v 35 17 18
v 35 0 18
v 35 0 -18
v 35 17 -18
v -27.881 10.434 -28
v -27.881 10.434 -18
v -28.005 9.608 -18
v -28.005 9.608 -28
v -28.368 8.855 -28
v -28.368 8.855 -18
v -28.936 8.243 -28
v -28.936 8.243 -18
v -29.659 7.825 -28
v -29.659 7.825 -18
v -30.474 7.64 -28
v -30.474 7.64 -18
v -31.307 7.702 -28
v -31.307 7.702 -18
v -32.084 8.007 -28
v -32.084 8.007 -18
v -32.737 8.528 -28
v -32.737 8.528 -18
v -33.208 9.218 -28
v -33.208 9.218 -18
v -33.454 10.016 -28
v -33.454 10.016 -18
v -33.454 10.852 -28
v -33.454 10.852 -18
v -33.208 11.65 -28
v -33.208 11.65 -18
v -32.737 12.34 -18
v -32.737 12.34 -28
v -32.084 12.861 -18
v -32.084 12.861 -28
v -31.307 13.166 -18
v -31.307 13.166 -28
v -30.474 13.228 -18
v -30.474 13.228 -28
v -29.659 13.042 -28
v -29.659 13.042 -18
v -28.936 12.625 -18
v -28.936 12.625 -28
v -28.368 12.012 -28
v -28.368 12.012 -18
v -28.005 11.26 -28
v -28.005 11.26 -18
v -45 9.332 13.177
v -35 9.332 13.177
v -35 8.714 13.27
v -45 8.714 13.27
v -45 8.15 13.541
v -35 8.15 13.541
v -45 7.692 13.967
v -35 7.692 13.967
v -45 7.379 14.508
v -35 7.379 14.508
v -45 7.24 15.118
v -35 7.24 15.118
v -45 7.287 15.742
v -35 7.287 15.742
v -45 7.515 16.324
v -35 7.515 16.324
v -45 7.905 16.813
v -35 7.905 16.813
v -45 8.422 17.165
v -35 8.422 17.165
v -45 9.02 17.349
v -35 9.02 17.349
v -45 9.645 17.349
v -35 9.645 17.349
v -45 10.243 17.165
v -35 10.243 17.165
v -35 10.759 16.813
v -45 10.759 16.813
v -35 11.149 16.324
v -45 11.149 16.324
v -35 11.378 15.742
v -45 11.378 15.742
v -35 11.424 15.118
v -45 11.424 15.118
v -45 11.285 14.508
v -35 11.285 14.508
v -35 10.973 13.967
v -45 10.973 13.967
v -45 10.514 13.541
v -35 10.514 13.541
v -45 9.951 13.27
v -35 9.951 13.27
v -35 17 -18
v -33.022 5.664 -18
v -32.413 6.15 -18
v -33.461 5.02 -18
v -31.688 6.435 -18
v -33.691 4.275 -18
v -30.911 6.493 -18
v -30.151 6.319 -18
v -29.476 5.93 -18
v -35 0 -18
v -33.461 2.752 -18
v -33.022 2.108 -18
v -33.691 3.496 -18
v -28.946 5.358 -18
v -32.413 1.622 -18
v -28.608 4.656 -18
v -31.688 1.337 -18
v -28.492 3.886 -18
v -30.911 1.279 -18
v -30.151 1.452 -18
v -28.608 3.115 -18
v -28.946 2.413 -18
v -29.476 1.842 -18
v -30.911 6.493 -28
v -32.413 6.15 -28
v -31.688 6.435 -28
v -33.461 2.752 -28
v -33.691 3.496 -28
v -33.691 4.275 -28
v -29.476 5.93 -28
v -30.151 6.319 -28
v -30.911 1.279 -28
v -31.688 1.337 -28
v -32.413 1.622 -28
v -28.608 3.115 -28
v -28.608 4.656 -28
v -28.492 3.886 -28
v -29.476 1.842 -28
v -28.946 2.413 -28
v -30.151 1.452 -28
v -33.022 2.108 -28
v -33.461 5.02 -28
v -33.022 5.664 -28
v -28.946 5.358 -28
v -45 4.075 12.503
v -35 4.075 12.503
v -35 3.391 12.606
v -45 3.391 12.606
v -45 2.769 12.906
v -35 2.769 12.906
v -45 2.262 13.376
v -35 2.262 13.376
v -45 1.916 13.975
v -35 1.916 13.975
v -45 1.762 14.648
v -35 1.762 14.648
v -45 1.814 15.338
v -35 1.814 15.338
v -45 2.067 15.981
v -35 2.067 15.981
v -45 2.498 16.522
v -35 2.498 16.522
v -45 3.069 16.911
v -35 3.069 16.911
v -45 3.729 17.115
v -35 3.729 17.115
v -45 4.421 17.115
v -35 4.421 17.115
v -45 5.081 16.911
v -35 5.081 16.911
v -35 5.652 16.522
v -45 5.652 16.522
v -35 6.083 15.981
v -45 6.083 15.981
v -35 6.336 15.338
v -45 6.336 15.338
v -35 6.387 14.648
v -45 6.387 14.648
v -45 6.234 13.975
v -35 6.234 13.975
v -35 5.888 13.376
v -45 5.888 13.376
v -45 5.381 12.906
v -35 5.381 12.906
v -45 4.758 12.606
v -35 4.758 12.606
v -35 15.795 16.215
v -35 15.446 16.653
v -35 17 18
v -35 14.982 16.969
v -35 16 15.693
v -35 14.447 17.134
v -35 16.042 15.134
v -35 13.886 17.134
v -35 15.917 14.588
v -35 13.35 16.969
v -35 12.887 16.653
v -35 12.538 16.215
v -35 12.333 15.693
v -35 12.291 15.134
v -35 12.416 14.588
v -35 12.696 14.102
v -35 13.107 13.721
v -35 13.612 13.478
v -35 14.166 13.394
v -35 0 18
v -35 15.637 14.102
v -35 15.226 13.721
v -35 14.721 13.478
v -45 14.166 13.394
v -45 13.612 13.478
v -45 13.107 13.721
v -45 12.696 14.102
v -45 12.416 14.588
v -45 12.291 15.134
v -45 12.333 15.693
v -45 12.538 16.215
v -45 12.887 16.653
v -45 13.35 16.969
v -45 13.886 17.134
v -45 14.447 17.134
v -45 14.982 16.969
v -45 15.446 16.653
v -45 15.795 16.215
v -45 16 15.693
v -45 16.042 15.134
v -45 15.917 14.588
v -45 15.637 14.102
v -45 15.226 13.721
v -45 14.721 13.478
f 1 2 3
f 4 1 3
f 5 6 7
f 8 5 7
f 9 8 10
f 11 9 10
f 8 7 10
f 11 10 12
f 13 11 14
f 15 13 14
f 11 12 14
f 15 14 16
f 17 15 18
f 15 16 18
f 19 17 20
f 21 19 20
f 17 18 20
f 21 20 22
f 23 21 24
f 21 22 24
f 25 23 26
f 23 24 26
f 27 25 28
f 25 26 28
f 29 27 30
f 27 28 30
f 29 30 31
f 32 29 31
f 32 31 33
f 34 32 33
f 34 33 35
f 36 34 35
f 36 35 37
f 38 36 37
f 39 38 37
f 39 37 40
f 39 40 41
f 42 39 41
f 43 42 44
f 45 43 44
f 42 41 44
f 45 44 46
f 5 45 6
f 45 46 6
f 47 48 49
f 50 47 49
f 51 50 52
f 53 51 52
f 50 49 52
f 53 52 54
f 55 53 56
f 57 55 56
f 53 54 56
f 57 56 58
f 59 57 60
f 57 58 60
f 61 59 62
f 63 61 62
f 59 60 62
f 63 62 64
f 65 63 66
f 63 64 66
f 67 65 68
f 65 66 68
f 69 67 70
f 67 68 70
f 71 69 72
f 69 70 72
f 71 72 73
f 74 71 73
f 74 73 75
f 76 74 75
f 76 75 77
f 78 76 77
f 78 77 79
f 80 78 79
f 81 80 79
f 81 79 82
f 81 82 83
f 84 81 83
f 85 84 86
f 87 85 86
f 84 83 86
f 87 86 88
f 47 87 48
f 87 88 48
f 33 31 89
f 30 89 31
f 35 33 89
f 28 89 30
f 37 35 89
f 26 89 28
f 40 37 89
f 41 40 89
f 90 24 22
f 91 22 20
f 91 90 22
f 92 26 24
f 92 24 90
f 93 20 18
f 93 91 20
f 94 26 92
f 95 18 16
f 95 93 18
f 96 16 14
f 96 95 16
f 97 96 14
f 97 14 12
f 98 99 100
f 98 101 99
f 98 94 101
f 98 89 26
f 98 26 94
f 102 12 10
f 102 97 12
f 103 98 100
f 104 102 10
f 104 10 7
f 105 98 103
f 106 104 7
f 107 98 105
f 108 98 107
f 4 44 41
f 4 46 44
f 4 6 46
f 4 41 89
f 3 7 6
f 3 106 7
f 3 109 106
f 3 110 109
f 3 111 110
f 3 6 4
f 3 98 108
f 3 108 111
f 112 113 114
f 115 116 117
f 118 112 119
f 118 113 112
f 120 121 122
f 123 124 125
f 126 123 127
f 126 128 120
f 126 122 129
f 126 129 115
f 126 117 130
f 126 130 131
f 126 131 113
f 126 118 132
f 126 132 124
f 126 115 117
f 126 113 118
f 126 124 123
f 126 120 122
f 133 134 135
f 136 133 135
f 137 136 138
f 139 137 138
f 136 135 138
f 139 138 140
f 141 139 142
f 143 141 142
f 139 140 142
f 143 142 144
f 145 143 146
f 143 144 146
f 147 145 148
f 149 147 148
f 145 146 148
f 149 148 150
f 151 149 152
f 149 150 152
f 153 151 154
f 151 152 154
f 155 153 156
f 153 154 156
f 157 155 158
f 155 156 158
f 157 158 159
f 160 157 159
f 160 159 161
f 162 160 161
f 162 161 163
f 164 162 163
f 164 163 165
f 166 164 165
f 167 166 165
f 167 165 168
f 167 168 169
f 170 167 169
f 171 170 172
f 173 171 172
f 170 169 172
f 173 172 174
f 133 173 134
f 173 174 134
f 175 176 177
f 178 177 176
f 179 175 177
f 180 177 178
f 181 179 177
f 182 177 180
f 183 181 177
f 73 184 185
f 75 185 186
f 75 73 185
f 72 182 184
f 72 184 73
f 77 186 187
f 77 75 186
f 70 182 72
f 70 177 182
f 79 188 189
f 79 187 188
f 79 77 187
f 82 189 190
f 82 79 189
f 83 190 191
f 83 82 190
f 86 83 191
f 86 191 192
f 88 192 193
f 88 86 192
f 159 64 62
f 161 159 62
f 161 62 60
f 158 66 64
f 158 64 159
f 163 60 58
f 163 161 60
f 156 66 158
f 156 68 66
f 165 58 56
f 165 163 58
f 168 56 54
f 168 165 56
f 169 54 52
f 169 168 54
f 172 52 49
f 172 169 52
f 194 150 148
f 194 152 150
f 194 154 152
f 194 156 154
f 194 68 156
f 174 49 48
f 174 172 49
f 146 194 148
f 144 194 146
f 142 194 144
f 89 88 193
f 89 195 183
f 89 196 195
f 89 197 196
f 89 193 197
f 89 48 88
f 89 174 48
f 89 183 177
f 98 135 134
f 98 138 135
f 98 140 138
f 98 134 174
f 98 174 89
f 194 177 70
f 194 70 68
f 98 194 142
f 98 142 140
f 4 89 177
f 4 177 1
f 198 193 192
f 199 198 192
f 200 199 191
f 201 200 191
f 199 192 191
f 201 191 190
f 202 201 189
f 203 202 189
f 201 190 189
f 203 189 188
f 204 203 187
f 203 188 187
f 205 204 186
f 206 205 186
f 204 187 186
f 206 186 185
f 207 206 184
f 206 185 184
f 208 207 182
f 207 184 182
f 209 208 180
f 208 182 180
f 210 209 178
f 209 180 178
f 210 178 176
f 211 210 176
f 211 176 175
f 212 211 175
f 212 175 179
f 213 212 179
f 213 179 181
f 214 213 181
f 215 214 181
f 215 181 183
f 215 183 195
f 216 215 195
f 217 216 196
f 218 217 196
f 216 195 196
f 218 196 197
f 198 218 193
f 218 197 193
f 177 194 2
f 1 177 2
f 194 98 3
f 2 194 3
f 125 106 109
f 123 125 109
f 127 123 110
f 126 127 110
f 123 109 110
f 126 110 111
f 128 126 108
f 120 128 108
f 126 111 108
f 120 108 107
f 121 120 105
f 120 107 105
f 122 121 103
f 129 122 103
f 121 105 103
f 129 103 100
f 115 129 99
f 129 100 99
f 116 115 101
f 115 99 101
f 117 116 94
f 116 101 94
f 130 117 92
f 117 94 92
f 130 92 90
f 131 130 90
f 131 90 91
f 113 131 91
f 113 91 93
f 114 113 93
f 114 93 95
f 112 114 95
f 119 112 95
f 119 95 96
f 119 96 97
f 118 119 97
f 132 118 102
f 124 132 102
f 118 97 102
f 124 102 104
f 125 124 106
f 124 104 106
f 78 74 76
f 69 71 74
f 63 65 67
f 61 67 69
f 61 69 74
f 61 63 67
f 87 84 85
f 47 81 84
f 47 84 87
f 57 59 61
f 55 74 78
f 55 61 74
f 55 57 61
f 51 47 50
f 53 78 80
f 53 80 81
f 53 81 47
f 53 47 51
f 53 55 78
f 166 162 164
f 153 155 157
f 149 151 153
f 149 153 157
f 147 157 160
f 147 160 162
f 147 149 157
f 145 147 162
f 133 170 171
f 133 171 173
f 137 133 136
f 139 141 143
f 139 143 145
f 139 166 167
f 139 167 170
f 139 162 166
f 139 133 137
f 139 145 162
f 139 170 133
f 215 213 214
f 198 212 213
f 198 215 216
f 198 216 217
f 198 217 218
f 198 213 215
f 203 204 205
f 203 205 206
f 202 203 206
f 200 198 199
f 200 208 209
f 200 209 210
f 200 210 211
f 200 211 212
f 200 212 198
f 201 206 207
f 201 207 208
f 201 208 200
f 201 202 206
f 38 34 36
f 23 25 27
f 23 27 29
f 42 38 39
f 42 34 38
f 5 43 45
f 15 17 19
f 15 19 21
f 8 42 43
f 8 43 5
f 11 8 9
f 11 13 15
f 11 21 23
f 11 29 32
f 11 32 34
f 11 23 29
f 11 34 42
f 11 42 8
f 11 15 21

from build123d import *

# Parameters (mm, degrees)
SKETCH3_W           = 70
SKETCH3_H           = 36
BOSS_EXTRUDE2_DEPTH = 17
SKETCH4_R           = 1.880557467
SKETCH4_R_2         = 2.098035393
SKETCH4_R_3         = 2.319039591
BOSS_EXTRUDE3_DEPTH = 10
SKETCH5_R           = 2.614216035
SKETCH5_R_2         = 2.802234852
BOSS_EXTRUDE4_DEPTH = 10


with BuildPart() as part:
    # Sketch3 → Boss-Extrude2 (new body)
    with BuildSketch(Plane(origin=(0, 0, 0), x_dir=(1, 0, 0), z_dir=(0, 1, 0))):
        Rectangle(SKETCH3_W, SKETCH3_H)
    extrude(amount=BOSS_EXTRUDE2_DEPTH)

    # Sketch4 → Boss-Extrude3 (add)
    with BuildSketch(Plane.ZY.offset(35)):
        with Locations(Location((15.274859304, 14.166430081, 0), (0, 0, 180))):
            Circle(SKETCH4_R)
        with Locations(Location((15.274859304, 9.332242636, 0), (0, 0, 180))):
            Circle(SKETCH4_R_2)
        with Locations(Location((14.82177003, 4.074871994, 0), (0, 0, 180))):
            Circle(SKETCH4_R_3)
    extrude(amount=BOSS_EXTRUDE3_DEPTH)

    # Sketch5 → Boss-Extrude4 (add)
    with BuildSketch(Plane(origin=(0, 0, -18), x_dir=(-1, 0, 0), z_dir=(0, 0, -1))):
        with Locations(Location((31.106031622, 3.885850759, 0), (0, 0, 180))):
            Circle(SKETCH5_R)
        with Locations(Location((30.683181336, 10.433921975, 0), (0, 0, 180))):
            Circle(SKETCH5_R_2)
    extrude(amount=BOSS_EXTRUDE4_DEPTH)


solid = part.part
